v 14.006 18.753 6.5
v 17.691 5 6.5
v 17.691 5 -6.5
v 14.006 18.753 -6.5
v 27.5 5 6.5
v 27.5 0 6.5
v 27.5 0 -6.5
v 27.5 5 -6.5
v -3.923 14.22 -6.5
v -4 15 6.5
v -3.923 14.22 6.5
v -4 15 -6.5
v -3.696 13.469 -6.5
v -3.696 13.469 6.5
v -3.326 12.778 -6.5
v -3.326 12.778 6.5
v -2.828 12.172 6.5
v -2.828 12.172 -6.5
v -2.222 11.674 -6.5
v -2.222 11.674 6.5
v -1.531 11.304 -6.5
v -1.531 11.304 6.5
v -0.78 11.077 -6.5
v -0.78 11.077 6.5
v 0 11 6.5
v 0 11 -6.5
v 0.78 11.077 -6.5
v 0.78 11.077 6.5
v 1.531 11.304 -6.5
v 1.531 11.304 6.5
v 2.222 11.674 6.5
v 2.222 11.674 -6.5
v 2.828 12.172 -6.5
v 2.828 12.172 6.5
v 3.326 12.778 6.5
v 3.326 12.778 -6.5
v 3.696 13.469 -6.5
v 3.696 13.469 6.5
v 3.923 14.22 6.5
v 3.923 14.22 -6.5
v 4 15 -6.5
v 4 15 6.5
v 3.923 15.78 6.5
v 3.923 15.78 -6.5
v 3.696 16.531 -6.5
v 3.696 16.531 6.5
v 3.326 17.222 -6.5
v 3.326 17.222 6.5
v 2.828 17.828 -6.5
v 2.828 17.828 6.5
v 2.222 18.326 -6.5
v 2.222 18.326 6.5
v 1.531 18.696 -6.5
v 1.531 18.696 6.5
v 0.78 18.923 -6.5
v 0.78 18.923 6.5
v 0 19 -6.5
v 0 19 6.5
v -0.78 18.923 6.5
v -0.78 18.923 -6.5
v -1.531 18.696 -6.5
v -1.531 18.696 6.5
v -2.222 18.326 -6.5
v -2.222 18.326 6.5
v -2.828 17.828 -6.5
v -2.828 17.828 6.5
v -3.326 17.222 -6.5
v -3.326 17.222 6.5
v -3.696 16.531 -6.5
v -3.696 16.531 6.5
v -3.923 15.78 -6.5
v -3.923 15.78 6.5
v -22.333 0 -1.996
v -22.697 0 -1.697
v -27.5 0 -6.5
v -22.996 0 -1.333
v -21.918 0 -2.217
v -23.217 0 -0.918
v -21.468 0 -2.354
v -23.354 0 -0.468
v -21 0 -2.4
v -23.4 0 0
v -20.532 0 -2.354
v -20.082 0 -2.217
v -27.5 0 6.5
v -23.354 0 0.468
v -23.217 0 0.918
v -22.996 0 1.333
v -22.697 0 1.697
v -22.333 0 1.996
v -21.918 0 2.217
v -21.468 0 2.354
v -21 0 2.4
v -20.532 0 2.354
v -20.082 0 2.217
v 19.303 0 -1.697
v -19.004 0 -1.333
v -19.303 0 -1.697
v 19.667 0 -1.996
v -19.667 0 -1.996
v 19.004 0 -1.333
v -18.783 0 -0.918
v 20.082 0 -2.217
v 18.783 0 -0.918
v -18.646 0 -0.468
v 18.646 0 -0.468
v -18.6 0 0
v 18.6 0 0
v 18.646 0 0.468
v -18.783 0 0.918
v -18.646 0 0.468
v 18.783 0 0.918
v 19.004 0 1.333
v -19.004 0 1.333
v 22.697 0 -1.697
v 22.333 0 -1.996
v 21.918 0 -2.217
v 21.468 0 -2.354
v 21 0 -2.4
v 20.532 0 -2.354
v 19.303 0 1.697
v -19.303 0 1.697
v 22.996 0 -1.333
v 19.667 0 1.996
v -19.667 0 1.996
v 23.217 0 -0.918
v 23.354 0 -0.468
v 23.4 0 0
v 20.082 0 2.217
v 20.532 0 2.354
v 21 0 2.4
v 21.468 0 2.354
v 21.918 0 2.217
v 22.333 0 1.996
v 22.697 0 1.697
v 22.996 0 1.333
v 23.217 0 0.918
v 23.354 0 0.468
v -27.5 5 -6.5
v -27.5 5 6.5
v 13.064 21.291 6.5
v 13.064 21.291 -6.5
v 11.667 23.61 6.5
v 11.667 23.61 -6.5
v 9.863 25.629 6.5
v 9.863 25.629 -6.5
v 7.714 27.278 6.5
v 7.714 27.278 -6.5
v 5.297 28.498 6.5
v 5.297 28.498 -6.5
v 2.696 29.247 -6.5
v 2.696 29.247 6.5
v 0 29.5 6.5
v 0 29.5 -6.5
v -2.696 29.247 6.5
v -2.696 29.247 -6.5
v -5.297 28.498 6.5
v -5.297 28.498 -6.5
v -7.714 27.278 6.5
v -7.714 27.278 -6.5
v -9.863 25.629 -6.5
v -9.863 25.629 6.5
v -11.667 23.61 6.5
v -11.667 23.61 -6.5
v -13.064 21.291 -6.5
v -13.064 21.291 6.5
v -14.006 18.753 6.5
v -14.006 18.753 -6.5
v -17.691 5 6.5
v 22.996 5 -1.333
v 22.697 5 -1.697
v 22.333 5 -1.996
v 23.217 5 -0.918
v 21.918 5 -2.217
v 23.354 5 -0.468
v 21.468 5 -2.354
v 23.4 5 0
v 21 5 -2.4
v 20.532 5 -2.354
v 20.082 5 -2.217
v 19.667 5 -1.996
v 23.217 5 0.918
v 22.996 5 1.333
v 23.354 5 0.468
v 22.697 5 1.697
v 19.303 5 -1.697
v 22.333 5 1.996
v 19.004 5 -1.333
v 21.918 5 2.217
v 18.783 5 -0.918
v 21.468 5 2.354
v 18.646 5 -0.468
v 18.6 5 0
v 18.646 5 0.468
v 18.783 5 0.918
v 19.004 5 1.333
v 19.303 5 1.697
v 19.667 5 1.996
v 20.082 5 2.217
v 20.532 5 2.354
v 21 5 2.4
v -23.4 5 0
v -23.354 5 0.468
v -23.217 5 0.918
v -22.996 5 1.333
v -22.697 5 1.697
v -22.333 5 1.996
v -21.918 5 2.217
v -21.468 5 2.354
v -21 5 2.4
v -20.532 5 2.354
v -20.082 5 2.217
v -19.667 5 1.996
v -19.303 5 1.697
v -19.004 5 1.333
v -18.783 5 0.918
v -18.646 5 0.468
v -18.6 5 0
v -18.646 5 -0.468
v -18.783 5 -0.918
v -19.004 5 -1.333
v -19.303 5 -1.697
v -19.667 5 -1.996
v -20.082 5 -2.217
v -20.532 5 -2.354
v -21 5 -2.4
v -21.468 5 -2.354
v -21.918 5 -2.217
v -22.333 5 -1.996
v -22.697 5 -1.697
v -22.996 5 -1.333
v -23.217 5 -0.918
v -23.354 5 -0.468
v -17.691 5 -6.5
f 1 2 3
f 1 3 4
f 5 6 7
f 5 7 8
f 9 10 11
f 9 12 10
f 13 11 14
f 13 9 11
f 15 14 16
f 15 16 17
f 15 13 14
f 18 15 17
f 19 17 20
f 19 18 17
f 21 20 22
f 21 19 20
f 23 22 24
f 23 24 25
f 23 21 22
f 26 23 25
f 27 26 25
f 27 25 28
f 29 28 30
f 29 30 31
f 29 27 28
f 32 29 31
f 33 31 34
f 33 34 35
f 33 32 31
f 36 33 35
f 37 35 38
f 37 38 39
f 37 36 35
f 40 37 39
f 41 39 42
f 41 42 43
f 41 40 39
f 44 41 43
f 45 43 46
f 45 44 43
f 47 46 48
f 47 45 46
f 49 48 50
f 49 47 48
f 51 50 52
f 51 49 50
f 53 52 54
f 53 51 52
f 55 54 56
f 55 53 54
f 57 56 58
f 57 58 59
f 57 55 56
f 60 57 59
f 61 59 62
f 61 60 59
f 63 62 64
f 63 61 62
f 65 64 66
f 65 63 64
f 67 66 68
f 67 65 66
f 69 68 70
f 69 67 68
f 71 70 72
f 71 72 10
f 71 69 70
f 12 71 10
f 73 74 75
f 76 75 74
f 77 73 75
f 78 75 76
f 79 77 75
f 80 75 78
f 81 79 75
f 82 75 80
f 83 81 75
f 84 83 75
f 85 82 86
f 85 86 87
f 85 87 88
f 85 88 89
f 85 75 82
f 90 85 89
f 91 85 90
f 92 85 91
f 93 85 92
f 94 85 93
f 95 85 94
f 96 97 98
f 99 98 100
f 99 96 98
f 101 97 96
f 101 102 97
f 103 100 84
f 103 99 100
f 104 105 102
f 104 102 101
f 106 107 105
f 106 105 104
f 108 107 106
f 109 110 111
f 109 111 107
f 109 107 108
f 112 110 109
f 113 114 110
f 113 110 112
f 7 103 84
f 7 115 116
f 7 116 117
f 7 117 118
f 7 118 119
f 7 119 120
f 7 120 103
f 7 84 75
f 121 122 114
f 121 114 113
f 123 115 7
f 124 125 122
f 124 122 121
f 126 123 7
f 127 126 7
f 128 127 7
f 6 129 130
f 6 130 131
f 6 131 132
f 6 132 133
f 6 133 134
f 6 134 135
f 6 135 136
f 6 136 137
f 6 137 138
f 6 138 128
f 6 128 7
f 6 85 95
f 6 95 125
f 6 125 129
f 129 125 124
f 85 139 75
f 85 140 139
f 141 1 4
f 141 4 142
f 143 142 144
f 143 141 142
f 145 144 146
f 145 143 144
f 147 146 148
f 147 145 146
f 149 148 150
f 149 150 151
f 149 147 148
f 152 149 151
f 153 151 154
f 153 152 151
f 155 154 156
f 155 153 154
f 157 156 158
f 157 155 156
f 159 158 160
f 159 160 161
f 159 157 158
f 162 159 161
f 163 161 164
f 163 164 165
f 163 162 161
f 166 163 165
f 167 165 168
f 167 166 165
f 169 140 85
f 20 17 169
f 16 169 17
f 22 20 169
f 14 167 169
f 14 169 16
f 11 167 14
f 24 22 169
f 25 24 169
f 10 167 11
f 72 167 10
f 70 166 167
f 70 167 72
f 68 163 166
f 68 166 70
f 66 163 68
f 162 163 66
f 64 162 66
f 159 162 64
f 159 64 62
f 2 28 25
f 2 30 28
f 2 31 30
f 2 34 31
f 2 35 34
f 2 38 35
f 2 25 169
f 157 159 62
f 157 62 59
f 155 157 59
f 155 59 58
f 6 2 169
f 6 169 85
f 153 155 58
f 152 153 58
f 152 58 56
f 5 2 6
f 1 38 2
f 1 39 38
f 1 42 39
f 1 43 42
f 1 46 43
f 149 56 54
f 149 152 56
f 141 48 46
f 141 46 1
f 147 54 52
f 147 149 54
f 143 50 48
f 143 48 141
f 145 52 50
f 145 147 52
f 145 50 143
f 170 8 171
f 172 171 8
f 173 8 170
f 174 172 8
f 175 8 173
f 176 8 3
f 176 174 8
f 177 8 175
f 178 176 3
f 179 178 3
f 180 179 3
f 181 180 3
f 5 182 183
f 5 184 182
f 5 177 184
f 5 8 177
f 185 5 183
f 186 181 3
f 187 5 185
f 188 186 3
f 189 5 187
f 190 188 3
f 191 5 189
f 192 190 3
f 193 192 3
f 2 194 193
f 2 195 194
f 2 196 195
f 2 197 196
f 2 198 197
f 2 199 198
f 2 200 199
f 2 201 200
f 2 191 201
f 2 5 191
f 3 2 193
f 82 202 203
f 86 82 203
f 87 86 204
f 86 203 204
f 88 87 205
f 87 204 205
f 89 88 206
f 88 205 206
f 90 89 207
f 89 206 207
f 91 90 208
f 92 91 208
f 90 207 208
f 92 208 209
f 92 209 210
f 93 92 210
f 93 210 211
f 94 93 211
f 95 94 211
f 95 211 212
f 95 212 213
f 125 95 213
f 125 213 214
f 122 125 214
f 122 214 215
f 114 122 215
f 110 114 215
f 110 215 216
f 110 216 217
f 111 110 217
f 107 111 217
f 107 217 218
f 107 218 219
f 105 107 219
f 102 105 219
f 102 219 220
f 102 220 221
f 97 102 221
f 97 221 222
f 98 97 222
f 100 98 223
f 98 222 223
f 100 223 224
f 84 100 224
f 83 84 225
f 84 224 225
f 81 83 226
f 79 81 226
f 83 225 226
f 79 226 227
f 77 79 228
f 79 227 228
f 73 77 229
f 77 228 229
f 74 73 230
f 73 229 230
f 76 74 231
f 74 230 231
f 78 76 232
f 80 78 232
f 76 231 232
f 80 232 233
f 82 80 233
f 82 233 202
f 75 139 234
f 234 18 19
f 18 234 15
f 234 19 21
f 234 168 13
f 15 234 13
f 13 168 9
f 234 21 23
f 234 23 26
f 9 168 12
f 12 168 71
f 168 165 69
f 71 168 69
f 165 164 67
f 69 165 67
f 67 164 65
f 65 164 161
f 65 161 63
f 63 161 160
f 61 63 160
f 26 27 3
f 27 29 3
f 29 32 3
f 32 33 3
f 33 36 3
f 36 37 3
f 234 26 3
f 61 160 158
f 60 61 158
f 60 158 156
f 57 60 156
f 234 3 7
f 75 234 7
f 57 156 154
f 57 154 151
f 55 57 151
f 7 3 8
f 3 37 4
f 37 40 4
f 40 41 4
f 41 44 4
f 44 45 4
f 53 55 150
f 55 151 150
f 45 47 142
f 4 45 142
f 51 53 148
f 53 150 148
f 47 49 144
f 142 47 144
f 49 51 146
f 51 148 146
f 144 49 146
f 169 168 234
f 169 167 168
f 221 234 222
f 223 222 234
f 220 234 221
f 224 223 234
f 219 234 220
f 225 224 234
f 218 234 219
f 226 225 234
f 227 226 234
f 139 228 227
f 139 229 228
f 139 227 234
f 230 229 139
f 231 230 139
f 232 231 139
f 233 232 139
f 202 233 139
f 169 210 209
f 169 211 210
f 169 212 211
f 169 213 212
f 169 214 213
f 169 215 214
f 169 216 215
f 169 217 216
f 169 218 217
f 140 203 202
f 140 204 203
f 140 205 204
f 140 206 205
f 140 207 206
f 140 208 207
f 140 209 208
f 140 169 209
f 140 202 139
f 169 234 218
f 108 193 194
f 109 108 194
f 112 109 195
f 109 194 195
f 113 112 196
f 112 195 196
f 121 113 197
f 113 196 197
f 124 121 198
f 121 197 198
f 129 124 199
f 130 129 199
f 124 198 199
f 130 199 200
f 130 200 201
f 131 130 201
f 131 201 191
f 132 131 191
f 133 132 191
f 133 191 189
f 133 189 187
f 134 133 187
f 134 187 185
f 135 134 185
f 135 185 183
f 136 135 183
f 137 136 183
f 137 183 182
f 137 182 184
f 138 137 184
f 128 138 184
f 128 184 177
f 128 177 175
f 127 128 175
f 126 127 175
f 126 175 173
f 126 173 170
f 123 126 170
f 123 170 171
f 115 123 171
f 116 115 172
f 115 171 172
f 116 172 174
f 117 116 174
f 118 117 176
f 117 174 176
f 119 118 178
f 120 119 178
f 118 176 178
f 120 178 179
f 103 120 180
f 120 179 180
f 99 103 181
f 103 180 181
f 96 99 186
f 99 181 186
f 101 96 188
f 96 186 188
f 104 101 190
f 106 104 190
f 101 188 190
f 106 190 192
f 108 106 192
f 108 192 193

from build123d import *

# Parameters (mm, degrees)
SKETCH_1_R          = 4
EXTRUDE_1_DEPTH     = 6.5
SKETCH_2_R          = 2.4
CUT_EXTRUDE_1_DEPTH = 13


with BuildPart() as part:
    # 草图1 → 凸台-拉伸1 (new, symmetric)
    with BuildSketch(Plane.XY):
        with BuildLine():
            Line((-27.5, 0), (27.5, 0))
            Line((27.5, 0), (27.5, 5))
            Line((27.5, 5), (17.69099654, 5))
            Line((17.69099654, 5), (14.005924481, 18.752876154))
            ThreePointArc((14.005924481, 18.752876154), (0, 29.5), (-14.005924481, 18.752876154))
            Line((-14.005924481, 18.752876154), (-17.69099654, 5))
            Line((-17.69099654, 5), (-27.5, 5))
            Line((-27.5, 5), (-27.5, 0))
        make_face()
        with Locations(Location((0, 15, 0), (0, 0, 180))):
            Circle(SKETCH_1_R, mode=Mode.SUBTRACT)
    extrude(amount=EXTRUDE_1_DEPTH, both=True)

    # 草图2 → 切除-拉伸1 (cut)
    with BuildSketch(Plane(origin=(0, 5, 0), x_dir=(1, 0, 0), z_dir=(0, 1, 0))):
        with Locations(Location((-21, 0, 0), (0, 0, 180))):
            Circle(SKETCH_2_R)
        with Locations(Location((21, 0, 0), (0, 0, 180))):
            Circle(SKETCH_2_R)
    extrude(amount=-CUT_EXTRUDE_1_DEPTH, mode=Mode.SUBTRACT)


solid = part.part
